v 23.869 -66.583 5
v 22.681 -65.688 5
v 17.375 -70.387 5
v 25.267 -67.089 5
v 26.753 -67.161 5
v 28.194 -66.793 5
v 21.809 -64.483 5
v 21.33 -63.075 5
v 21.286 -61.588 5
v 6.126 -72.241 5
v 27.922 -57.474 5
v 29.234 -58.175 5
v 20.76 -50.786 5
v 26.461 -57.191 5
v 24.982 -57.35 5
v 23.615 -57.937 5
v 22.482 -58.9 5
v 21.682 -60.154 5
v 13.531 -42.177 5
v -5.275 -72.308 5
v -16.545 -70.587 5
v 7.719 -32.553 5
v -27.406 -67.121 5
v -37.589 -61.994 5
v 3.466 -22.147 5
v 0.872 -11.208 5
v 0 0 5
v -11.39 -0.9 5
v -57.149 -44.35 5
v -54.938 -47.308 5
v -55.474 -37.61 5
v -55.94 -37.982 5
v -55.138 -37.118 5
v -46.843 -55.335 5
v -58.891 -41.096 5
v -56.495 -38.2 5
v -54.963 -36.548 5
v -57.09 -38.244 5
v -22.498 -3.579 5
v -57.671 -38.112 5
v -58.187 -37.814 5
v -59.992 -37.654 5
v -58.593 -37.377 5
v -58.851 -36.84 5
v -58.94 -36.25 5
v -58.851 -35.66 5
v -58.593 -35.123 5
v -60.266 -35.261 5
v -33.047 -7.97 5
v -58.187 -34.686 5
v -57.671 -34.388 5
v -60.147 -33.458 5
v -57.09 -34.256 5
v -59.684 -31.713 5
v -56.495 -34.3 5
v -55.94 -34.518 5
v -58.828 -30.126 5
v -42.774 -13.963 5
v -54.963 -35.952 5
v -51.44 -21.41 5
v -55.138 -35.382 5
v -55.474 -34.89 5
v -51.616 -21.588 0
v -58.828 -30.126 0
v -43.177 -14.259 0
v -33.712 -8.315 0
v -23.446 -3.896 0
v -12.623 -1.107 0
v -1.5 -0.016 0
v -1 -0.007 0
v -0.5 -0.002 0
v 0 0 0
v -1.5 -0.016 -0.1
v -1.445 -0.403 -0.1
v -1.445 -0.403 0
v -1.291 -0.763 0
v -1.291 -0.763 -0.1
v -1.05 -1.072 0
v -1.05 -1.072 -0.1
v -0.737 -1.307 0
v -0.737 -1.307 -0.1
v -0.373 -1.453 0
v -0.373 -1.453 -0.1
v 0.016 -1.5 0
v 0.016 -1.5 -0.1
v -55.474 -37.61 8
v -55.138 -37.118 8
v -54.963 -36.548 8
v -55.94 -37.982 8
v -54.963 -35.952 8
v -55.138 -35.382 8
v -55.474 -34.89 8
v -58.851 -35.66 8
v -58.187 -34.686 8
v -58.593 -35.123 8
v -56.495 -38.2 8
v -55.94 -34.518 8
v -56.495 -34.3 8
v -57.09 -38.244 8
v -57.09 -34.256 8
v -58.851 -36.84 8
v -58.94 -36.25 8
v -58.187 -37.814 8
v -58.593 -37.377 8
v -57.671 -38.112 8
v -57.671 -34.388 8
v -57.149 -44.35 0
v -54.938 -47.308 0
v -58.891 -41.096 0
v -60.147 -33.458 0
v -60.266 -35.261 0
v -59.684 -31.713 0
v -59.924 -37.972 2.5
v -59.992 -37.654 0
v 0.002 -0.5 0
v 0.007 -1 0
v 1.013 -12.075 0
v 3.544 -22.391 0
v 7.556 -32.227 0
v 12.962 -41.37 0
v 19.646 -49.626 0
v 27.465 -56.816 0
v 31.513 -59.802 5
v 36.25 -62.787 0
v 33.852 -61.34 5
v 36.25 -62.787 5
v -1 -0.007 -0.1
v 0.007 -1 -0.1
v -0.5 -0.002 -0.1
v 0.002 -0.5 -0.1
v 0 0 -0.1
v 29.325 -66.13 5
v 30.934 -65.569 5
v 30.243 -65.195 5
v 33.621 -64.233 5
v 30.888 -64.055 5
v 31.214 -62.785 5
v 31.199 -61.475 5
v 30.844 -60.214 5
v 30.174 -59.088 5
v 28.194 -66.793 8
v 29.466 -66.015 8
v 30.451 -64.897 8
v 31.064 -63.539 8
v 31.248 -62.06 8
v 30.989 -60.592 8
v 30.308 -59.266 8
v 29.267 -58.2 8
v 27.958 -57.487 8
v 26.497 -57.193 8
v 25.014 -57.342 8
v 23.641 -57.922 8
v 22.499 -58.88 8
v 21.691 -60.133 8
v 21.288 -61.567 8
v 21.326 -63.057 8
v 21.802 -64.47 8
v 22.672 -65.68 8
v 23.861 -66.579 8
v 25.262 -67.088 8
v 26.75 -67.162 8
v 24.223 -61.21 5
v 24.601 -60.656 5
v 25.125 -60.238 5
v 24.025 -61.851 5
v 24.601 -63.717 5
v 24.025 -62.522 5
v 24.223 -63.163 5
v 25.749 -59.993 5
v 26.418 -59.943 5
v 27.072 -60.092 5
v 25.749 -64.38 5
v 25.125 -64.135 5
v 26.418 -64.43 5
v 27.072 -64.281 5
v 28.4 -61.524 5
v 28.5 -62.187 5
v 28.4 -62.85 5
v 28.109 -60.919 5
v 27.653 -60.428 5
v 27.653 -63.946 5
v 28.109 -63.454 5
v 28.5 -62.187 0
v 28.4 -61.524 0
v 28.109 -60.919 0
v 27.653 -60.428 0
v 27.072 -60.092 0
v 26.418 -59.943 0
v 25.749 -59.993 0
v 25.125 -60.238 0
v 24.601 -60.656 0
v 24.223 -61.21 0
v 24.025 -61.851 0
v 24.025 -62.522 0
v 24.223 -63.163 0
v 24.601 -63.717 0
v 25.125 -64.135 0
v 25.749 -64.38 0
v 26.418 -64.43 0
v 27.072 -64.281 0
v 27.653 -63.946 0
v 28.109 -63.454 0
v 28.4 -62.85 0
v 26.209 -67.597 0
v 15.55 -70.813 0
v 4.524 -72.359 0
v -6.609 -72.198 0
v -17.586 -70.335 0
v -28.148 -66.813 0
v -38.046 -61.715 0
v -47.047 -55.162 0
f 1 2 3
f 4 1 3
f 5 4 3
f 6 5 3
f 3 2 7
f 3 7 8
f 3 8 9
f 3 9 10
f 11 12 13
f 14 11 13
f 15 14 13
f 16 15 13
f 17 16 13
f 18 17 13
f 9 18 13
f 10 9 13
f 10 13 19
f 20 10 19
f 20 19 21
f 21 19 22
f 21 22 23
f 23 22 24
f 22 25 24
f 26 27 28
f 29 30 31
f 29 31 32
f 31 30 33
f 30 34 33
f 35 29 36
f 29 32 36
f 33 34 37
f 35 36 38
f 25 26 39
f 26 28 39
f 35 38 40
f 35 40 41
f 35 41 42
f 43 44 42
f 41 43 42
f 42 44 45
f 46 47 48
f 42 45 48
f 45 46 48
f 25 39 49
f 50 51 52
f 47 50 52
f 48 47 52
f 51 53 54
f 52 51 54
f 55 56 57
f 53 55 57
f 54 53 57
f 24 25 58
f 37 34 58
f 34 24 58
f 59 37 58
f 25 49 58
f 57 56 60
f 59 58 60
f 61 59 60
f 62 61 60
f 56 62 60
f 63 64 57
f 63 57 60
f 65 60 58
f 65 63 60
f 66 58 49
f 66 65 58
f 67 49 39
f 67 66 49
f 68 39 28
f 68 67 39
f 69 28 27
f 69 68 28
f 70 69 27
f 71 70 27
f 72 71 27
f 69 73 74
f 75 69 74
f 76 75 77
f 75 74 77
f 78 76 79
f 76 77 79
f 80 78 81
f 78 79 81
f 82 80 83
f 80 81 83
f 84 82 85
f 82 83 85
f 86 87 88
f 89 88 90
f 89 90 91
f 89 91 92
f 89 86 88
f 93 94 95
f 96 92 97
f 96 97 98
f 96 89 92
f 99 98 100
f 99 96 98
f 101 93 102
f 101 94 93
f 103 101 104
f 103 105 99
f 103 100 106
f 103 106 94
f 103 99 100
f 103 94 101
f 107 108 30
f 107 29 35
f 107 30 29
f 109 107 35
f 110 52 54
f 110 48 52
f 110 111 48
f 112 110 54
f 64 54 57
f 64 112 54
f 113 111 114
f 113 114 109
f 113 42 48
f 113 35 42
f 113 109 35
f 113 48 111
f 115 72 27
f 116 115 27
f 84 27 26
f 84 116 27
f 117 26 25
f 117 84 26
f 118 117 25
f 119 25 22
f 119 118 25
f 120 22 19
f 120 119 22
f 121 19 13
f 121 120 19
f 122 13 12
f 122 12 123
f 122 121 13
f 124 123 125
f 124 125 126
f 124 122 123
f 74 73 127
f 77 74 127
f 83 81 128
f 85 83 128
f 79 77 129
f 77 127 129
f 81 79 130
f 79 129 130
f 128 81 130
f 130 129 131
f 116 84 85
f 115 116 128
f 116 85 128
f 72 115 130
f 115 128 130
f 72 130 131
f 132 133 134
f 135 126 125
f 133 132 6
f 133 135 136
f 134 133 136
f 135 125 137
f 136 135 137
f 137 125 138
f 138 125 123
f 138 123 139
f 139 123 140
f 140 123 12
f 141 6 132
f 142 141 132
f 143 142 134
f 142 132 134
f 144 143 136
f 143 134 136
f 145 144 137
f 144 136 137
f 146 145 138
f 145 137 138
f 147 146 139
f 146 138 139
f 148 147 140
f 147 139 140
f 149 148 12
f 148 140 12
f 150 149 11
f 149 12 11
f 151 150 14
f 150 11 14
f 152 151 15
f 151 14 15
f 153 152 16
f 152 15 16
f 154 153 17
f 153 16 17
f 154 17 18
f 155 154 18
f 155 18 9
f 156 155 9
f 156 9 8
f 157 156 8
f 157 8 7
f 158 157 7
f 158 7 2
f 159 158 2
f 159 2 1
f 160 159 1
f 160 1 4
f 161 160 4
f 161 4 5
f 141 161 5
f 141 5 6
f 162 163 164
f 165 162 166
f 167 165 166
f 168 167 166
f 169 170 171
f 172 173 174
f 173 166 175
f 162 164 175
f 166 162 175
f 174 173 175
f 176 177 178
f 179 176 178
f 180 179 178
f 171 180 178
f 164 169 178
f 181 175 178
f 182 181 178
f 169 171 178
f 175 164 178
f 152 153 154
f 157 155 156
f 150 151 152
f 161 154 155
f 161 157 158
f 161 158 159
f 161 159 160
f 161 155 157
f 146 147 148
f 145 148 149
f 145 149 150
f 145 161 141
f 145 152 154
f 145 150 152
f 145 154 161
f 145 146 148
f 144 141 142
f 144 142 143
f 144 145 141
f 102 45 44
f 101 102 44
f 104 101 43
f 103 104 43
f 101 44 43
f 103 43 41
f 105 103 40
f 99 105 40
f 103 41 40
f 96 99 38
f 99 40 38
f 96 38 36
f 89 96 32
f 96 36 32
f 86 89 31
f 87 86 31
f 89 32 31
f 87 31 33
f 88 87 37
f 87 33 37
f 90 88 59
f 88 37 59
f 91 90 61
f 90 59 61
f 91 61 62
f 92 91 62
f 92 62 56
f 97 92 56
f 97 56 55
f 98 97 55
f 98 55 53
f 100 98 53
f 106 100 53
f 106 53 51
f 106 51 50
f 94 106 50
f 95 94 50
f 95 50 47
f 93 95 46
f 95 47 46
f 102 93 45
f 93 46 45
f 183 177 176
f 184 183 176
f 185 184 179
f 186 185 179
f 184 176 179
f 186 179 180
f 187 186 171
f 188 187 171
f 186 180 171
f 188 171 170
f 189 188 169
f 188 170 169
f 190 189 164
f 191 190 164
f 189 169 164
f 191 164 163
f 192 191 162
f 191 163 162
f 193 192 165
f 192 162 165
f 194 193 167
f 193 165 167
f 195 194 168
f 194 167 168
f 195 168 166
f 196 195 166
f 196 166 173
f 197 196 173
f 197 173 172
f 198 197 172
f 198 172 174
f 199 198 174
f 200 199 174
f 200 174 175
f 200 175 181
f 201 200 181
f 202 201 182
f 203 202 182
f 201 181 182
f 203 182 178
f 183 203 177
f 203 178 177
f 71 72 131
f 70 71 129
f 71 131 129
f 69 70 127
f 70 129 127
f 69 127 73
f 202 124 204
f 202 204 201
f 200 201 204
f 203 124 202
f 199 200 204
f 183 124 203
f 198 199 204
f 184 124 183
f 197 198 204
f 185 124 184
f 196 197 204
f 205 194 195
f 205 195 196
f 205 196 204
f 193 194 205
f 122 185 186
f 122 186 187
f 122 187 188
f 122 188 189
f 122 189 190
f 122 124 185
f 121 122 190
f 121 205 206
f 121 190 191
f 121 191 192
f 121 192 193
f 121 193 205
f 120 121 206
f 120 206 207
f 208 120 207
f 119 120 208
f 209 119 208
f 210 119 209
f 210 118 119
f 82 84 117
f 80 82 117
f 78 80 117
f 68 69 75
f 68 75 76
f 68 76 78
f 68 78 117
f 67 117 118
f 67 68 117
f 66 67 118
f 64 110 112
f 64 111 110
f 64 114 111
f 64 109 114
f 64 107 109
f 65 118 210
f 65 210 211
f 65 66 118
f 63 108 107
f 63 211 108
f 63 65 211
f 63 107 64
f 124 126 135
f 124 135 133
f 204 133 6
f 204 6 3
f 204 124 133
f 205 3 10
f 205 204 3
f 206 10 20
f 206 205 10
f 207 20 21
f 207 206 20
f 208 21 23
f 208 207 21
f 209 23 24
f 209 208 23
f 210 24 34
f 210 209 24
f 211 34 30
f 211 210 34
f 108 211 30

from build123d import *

# Parameters (mm, degrees)
ESTRUSIONE_ESTRUSIONE1_DEPTH = 5
SCHIZZO2_R                   = 2
ESTRUSIONE_ESTRUSIONE3_DEPTH = 3
SCHIZZO3_R                   = 2.25
TAGLIO_ESTRUSIONE2_DEPTH     = 5
SCHIZZO4_R                   = 5
ESTRUSIONE_ESTRUSIONE4_DEPTH = 3
ESTRUSIONE_ESTRUSIONE5_START = -5.1
ESTRUSIONE_ESTRUSIONE5_DEPTH = 0.1


with BuildPart() as part:
    # Schizzo1 → Estrusione-Estrusione1 (new body)
    with BuildSketch(Plane.XY):
        with BuildLine():
            ThreePointArc((-62.786841774, -36.25), (-36.25, -9.713158226), (0, 0))
            ThreePointArc((0, 0), (9.713158226, -36.25), (36.25, -62.786841774))
            ThreePointArc((36.25, -62.786841774), (-18.76438077, -70.029622406), (-62.786841774, -36.25))
        make_face()
    extrude(amount=ESTRUSIONE_ESTRUSIONE1_DEPTH)

    # Schizzo2 → Estrusione-Estrusione3 (add)
    with BuildSketch(Plane.XY.offset(5)):
        with Locations(Location((-56.94020987, -36.25, 0), (0, 0, 180))):
            Circle(SCHIZZO2_R)
    extrude(amount=ESTRUSIONE_ESTRUSIONE3_DEPTH)

    # Schizzo3 → Taglio-Estrusione2 (cut)
    with BuildSketch(Plane.XY.offset(5)):
        with Locations((26.25, -62.186714819)):
            Circle(SCHIZZO3_R)
    extrude(amount=-TAGLIO_ESTRUSIONE2_DEPTH, mode=Mode.SUBTRACT)

    # Raccordo2
    # an asymmetric fillet: 16, 12 mm, written as the material it takes off along each edge
    with BuildSketch(Plane(origin=(-62.786841774, -36.25, -33.900186603), x_dir=(0.5787975585185353, -0.8154712663564442, 0), z_dir=(0, 0, 1))) as raccordo2_piece_1:
        with BuildLine():
            Bezier((13.560074641, 0), (0.046255616, -1.269344794), (-2.702341636, 6.773027618), weights=[1, 0.785330936, 1])
            ThreePointArc((-2.702341636, 6.773027618), (-1.43638067, 3.35251629), (0, 0))
            ThreePointArc((0, 0), (6.780037321, -0.317723131), (13.560074641, 0))
        make_face()
    extrude(amount=72.800373207, mode=Mode.SUBTRACT)

    # Schizzo4 → Estrusione-Estrusione4 (add)
    with BuildSketch(Plane.XY.offset(5)):
        with Locations(Location((26.25, -62.186714819, 0), (0, 0, 292.885380476))):
            Circle(SCHIZZO4_R)
    extrude(amount=ESTRUSIONE_ESTRUSIONE4_DEPTH)

    # Schizzo5 → Estrusione-Estrusione5 (add)
    with BuildSketch(Plane.XY.offset(5).offset(ESTRUSIONE_ESTRUSIONE5_START)):
        with BuildLine():
            ThreePointArc((-1.499919736, -0.015517241), (-1.04963107, -1.071575763), (0.015517241, -1.499919736))
            ThreePointArc((0.015517241, -1.499919736), (0.003879414, -0.75), (0, 0))
            ThreePointArc((0, 0), (-0.75, -0.003879414), (-1.499919736, -0.015517241))
        make_face()
    extrude(amount=ESTRUSIONE_ESTRUSIONE5_DEPTH)


solid = part.part
